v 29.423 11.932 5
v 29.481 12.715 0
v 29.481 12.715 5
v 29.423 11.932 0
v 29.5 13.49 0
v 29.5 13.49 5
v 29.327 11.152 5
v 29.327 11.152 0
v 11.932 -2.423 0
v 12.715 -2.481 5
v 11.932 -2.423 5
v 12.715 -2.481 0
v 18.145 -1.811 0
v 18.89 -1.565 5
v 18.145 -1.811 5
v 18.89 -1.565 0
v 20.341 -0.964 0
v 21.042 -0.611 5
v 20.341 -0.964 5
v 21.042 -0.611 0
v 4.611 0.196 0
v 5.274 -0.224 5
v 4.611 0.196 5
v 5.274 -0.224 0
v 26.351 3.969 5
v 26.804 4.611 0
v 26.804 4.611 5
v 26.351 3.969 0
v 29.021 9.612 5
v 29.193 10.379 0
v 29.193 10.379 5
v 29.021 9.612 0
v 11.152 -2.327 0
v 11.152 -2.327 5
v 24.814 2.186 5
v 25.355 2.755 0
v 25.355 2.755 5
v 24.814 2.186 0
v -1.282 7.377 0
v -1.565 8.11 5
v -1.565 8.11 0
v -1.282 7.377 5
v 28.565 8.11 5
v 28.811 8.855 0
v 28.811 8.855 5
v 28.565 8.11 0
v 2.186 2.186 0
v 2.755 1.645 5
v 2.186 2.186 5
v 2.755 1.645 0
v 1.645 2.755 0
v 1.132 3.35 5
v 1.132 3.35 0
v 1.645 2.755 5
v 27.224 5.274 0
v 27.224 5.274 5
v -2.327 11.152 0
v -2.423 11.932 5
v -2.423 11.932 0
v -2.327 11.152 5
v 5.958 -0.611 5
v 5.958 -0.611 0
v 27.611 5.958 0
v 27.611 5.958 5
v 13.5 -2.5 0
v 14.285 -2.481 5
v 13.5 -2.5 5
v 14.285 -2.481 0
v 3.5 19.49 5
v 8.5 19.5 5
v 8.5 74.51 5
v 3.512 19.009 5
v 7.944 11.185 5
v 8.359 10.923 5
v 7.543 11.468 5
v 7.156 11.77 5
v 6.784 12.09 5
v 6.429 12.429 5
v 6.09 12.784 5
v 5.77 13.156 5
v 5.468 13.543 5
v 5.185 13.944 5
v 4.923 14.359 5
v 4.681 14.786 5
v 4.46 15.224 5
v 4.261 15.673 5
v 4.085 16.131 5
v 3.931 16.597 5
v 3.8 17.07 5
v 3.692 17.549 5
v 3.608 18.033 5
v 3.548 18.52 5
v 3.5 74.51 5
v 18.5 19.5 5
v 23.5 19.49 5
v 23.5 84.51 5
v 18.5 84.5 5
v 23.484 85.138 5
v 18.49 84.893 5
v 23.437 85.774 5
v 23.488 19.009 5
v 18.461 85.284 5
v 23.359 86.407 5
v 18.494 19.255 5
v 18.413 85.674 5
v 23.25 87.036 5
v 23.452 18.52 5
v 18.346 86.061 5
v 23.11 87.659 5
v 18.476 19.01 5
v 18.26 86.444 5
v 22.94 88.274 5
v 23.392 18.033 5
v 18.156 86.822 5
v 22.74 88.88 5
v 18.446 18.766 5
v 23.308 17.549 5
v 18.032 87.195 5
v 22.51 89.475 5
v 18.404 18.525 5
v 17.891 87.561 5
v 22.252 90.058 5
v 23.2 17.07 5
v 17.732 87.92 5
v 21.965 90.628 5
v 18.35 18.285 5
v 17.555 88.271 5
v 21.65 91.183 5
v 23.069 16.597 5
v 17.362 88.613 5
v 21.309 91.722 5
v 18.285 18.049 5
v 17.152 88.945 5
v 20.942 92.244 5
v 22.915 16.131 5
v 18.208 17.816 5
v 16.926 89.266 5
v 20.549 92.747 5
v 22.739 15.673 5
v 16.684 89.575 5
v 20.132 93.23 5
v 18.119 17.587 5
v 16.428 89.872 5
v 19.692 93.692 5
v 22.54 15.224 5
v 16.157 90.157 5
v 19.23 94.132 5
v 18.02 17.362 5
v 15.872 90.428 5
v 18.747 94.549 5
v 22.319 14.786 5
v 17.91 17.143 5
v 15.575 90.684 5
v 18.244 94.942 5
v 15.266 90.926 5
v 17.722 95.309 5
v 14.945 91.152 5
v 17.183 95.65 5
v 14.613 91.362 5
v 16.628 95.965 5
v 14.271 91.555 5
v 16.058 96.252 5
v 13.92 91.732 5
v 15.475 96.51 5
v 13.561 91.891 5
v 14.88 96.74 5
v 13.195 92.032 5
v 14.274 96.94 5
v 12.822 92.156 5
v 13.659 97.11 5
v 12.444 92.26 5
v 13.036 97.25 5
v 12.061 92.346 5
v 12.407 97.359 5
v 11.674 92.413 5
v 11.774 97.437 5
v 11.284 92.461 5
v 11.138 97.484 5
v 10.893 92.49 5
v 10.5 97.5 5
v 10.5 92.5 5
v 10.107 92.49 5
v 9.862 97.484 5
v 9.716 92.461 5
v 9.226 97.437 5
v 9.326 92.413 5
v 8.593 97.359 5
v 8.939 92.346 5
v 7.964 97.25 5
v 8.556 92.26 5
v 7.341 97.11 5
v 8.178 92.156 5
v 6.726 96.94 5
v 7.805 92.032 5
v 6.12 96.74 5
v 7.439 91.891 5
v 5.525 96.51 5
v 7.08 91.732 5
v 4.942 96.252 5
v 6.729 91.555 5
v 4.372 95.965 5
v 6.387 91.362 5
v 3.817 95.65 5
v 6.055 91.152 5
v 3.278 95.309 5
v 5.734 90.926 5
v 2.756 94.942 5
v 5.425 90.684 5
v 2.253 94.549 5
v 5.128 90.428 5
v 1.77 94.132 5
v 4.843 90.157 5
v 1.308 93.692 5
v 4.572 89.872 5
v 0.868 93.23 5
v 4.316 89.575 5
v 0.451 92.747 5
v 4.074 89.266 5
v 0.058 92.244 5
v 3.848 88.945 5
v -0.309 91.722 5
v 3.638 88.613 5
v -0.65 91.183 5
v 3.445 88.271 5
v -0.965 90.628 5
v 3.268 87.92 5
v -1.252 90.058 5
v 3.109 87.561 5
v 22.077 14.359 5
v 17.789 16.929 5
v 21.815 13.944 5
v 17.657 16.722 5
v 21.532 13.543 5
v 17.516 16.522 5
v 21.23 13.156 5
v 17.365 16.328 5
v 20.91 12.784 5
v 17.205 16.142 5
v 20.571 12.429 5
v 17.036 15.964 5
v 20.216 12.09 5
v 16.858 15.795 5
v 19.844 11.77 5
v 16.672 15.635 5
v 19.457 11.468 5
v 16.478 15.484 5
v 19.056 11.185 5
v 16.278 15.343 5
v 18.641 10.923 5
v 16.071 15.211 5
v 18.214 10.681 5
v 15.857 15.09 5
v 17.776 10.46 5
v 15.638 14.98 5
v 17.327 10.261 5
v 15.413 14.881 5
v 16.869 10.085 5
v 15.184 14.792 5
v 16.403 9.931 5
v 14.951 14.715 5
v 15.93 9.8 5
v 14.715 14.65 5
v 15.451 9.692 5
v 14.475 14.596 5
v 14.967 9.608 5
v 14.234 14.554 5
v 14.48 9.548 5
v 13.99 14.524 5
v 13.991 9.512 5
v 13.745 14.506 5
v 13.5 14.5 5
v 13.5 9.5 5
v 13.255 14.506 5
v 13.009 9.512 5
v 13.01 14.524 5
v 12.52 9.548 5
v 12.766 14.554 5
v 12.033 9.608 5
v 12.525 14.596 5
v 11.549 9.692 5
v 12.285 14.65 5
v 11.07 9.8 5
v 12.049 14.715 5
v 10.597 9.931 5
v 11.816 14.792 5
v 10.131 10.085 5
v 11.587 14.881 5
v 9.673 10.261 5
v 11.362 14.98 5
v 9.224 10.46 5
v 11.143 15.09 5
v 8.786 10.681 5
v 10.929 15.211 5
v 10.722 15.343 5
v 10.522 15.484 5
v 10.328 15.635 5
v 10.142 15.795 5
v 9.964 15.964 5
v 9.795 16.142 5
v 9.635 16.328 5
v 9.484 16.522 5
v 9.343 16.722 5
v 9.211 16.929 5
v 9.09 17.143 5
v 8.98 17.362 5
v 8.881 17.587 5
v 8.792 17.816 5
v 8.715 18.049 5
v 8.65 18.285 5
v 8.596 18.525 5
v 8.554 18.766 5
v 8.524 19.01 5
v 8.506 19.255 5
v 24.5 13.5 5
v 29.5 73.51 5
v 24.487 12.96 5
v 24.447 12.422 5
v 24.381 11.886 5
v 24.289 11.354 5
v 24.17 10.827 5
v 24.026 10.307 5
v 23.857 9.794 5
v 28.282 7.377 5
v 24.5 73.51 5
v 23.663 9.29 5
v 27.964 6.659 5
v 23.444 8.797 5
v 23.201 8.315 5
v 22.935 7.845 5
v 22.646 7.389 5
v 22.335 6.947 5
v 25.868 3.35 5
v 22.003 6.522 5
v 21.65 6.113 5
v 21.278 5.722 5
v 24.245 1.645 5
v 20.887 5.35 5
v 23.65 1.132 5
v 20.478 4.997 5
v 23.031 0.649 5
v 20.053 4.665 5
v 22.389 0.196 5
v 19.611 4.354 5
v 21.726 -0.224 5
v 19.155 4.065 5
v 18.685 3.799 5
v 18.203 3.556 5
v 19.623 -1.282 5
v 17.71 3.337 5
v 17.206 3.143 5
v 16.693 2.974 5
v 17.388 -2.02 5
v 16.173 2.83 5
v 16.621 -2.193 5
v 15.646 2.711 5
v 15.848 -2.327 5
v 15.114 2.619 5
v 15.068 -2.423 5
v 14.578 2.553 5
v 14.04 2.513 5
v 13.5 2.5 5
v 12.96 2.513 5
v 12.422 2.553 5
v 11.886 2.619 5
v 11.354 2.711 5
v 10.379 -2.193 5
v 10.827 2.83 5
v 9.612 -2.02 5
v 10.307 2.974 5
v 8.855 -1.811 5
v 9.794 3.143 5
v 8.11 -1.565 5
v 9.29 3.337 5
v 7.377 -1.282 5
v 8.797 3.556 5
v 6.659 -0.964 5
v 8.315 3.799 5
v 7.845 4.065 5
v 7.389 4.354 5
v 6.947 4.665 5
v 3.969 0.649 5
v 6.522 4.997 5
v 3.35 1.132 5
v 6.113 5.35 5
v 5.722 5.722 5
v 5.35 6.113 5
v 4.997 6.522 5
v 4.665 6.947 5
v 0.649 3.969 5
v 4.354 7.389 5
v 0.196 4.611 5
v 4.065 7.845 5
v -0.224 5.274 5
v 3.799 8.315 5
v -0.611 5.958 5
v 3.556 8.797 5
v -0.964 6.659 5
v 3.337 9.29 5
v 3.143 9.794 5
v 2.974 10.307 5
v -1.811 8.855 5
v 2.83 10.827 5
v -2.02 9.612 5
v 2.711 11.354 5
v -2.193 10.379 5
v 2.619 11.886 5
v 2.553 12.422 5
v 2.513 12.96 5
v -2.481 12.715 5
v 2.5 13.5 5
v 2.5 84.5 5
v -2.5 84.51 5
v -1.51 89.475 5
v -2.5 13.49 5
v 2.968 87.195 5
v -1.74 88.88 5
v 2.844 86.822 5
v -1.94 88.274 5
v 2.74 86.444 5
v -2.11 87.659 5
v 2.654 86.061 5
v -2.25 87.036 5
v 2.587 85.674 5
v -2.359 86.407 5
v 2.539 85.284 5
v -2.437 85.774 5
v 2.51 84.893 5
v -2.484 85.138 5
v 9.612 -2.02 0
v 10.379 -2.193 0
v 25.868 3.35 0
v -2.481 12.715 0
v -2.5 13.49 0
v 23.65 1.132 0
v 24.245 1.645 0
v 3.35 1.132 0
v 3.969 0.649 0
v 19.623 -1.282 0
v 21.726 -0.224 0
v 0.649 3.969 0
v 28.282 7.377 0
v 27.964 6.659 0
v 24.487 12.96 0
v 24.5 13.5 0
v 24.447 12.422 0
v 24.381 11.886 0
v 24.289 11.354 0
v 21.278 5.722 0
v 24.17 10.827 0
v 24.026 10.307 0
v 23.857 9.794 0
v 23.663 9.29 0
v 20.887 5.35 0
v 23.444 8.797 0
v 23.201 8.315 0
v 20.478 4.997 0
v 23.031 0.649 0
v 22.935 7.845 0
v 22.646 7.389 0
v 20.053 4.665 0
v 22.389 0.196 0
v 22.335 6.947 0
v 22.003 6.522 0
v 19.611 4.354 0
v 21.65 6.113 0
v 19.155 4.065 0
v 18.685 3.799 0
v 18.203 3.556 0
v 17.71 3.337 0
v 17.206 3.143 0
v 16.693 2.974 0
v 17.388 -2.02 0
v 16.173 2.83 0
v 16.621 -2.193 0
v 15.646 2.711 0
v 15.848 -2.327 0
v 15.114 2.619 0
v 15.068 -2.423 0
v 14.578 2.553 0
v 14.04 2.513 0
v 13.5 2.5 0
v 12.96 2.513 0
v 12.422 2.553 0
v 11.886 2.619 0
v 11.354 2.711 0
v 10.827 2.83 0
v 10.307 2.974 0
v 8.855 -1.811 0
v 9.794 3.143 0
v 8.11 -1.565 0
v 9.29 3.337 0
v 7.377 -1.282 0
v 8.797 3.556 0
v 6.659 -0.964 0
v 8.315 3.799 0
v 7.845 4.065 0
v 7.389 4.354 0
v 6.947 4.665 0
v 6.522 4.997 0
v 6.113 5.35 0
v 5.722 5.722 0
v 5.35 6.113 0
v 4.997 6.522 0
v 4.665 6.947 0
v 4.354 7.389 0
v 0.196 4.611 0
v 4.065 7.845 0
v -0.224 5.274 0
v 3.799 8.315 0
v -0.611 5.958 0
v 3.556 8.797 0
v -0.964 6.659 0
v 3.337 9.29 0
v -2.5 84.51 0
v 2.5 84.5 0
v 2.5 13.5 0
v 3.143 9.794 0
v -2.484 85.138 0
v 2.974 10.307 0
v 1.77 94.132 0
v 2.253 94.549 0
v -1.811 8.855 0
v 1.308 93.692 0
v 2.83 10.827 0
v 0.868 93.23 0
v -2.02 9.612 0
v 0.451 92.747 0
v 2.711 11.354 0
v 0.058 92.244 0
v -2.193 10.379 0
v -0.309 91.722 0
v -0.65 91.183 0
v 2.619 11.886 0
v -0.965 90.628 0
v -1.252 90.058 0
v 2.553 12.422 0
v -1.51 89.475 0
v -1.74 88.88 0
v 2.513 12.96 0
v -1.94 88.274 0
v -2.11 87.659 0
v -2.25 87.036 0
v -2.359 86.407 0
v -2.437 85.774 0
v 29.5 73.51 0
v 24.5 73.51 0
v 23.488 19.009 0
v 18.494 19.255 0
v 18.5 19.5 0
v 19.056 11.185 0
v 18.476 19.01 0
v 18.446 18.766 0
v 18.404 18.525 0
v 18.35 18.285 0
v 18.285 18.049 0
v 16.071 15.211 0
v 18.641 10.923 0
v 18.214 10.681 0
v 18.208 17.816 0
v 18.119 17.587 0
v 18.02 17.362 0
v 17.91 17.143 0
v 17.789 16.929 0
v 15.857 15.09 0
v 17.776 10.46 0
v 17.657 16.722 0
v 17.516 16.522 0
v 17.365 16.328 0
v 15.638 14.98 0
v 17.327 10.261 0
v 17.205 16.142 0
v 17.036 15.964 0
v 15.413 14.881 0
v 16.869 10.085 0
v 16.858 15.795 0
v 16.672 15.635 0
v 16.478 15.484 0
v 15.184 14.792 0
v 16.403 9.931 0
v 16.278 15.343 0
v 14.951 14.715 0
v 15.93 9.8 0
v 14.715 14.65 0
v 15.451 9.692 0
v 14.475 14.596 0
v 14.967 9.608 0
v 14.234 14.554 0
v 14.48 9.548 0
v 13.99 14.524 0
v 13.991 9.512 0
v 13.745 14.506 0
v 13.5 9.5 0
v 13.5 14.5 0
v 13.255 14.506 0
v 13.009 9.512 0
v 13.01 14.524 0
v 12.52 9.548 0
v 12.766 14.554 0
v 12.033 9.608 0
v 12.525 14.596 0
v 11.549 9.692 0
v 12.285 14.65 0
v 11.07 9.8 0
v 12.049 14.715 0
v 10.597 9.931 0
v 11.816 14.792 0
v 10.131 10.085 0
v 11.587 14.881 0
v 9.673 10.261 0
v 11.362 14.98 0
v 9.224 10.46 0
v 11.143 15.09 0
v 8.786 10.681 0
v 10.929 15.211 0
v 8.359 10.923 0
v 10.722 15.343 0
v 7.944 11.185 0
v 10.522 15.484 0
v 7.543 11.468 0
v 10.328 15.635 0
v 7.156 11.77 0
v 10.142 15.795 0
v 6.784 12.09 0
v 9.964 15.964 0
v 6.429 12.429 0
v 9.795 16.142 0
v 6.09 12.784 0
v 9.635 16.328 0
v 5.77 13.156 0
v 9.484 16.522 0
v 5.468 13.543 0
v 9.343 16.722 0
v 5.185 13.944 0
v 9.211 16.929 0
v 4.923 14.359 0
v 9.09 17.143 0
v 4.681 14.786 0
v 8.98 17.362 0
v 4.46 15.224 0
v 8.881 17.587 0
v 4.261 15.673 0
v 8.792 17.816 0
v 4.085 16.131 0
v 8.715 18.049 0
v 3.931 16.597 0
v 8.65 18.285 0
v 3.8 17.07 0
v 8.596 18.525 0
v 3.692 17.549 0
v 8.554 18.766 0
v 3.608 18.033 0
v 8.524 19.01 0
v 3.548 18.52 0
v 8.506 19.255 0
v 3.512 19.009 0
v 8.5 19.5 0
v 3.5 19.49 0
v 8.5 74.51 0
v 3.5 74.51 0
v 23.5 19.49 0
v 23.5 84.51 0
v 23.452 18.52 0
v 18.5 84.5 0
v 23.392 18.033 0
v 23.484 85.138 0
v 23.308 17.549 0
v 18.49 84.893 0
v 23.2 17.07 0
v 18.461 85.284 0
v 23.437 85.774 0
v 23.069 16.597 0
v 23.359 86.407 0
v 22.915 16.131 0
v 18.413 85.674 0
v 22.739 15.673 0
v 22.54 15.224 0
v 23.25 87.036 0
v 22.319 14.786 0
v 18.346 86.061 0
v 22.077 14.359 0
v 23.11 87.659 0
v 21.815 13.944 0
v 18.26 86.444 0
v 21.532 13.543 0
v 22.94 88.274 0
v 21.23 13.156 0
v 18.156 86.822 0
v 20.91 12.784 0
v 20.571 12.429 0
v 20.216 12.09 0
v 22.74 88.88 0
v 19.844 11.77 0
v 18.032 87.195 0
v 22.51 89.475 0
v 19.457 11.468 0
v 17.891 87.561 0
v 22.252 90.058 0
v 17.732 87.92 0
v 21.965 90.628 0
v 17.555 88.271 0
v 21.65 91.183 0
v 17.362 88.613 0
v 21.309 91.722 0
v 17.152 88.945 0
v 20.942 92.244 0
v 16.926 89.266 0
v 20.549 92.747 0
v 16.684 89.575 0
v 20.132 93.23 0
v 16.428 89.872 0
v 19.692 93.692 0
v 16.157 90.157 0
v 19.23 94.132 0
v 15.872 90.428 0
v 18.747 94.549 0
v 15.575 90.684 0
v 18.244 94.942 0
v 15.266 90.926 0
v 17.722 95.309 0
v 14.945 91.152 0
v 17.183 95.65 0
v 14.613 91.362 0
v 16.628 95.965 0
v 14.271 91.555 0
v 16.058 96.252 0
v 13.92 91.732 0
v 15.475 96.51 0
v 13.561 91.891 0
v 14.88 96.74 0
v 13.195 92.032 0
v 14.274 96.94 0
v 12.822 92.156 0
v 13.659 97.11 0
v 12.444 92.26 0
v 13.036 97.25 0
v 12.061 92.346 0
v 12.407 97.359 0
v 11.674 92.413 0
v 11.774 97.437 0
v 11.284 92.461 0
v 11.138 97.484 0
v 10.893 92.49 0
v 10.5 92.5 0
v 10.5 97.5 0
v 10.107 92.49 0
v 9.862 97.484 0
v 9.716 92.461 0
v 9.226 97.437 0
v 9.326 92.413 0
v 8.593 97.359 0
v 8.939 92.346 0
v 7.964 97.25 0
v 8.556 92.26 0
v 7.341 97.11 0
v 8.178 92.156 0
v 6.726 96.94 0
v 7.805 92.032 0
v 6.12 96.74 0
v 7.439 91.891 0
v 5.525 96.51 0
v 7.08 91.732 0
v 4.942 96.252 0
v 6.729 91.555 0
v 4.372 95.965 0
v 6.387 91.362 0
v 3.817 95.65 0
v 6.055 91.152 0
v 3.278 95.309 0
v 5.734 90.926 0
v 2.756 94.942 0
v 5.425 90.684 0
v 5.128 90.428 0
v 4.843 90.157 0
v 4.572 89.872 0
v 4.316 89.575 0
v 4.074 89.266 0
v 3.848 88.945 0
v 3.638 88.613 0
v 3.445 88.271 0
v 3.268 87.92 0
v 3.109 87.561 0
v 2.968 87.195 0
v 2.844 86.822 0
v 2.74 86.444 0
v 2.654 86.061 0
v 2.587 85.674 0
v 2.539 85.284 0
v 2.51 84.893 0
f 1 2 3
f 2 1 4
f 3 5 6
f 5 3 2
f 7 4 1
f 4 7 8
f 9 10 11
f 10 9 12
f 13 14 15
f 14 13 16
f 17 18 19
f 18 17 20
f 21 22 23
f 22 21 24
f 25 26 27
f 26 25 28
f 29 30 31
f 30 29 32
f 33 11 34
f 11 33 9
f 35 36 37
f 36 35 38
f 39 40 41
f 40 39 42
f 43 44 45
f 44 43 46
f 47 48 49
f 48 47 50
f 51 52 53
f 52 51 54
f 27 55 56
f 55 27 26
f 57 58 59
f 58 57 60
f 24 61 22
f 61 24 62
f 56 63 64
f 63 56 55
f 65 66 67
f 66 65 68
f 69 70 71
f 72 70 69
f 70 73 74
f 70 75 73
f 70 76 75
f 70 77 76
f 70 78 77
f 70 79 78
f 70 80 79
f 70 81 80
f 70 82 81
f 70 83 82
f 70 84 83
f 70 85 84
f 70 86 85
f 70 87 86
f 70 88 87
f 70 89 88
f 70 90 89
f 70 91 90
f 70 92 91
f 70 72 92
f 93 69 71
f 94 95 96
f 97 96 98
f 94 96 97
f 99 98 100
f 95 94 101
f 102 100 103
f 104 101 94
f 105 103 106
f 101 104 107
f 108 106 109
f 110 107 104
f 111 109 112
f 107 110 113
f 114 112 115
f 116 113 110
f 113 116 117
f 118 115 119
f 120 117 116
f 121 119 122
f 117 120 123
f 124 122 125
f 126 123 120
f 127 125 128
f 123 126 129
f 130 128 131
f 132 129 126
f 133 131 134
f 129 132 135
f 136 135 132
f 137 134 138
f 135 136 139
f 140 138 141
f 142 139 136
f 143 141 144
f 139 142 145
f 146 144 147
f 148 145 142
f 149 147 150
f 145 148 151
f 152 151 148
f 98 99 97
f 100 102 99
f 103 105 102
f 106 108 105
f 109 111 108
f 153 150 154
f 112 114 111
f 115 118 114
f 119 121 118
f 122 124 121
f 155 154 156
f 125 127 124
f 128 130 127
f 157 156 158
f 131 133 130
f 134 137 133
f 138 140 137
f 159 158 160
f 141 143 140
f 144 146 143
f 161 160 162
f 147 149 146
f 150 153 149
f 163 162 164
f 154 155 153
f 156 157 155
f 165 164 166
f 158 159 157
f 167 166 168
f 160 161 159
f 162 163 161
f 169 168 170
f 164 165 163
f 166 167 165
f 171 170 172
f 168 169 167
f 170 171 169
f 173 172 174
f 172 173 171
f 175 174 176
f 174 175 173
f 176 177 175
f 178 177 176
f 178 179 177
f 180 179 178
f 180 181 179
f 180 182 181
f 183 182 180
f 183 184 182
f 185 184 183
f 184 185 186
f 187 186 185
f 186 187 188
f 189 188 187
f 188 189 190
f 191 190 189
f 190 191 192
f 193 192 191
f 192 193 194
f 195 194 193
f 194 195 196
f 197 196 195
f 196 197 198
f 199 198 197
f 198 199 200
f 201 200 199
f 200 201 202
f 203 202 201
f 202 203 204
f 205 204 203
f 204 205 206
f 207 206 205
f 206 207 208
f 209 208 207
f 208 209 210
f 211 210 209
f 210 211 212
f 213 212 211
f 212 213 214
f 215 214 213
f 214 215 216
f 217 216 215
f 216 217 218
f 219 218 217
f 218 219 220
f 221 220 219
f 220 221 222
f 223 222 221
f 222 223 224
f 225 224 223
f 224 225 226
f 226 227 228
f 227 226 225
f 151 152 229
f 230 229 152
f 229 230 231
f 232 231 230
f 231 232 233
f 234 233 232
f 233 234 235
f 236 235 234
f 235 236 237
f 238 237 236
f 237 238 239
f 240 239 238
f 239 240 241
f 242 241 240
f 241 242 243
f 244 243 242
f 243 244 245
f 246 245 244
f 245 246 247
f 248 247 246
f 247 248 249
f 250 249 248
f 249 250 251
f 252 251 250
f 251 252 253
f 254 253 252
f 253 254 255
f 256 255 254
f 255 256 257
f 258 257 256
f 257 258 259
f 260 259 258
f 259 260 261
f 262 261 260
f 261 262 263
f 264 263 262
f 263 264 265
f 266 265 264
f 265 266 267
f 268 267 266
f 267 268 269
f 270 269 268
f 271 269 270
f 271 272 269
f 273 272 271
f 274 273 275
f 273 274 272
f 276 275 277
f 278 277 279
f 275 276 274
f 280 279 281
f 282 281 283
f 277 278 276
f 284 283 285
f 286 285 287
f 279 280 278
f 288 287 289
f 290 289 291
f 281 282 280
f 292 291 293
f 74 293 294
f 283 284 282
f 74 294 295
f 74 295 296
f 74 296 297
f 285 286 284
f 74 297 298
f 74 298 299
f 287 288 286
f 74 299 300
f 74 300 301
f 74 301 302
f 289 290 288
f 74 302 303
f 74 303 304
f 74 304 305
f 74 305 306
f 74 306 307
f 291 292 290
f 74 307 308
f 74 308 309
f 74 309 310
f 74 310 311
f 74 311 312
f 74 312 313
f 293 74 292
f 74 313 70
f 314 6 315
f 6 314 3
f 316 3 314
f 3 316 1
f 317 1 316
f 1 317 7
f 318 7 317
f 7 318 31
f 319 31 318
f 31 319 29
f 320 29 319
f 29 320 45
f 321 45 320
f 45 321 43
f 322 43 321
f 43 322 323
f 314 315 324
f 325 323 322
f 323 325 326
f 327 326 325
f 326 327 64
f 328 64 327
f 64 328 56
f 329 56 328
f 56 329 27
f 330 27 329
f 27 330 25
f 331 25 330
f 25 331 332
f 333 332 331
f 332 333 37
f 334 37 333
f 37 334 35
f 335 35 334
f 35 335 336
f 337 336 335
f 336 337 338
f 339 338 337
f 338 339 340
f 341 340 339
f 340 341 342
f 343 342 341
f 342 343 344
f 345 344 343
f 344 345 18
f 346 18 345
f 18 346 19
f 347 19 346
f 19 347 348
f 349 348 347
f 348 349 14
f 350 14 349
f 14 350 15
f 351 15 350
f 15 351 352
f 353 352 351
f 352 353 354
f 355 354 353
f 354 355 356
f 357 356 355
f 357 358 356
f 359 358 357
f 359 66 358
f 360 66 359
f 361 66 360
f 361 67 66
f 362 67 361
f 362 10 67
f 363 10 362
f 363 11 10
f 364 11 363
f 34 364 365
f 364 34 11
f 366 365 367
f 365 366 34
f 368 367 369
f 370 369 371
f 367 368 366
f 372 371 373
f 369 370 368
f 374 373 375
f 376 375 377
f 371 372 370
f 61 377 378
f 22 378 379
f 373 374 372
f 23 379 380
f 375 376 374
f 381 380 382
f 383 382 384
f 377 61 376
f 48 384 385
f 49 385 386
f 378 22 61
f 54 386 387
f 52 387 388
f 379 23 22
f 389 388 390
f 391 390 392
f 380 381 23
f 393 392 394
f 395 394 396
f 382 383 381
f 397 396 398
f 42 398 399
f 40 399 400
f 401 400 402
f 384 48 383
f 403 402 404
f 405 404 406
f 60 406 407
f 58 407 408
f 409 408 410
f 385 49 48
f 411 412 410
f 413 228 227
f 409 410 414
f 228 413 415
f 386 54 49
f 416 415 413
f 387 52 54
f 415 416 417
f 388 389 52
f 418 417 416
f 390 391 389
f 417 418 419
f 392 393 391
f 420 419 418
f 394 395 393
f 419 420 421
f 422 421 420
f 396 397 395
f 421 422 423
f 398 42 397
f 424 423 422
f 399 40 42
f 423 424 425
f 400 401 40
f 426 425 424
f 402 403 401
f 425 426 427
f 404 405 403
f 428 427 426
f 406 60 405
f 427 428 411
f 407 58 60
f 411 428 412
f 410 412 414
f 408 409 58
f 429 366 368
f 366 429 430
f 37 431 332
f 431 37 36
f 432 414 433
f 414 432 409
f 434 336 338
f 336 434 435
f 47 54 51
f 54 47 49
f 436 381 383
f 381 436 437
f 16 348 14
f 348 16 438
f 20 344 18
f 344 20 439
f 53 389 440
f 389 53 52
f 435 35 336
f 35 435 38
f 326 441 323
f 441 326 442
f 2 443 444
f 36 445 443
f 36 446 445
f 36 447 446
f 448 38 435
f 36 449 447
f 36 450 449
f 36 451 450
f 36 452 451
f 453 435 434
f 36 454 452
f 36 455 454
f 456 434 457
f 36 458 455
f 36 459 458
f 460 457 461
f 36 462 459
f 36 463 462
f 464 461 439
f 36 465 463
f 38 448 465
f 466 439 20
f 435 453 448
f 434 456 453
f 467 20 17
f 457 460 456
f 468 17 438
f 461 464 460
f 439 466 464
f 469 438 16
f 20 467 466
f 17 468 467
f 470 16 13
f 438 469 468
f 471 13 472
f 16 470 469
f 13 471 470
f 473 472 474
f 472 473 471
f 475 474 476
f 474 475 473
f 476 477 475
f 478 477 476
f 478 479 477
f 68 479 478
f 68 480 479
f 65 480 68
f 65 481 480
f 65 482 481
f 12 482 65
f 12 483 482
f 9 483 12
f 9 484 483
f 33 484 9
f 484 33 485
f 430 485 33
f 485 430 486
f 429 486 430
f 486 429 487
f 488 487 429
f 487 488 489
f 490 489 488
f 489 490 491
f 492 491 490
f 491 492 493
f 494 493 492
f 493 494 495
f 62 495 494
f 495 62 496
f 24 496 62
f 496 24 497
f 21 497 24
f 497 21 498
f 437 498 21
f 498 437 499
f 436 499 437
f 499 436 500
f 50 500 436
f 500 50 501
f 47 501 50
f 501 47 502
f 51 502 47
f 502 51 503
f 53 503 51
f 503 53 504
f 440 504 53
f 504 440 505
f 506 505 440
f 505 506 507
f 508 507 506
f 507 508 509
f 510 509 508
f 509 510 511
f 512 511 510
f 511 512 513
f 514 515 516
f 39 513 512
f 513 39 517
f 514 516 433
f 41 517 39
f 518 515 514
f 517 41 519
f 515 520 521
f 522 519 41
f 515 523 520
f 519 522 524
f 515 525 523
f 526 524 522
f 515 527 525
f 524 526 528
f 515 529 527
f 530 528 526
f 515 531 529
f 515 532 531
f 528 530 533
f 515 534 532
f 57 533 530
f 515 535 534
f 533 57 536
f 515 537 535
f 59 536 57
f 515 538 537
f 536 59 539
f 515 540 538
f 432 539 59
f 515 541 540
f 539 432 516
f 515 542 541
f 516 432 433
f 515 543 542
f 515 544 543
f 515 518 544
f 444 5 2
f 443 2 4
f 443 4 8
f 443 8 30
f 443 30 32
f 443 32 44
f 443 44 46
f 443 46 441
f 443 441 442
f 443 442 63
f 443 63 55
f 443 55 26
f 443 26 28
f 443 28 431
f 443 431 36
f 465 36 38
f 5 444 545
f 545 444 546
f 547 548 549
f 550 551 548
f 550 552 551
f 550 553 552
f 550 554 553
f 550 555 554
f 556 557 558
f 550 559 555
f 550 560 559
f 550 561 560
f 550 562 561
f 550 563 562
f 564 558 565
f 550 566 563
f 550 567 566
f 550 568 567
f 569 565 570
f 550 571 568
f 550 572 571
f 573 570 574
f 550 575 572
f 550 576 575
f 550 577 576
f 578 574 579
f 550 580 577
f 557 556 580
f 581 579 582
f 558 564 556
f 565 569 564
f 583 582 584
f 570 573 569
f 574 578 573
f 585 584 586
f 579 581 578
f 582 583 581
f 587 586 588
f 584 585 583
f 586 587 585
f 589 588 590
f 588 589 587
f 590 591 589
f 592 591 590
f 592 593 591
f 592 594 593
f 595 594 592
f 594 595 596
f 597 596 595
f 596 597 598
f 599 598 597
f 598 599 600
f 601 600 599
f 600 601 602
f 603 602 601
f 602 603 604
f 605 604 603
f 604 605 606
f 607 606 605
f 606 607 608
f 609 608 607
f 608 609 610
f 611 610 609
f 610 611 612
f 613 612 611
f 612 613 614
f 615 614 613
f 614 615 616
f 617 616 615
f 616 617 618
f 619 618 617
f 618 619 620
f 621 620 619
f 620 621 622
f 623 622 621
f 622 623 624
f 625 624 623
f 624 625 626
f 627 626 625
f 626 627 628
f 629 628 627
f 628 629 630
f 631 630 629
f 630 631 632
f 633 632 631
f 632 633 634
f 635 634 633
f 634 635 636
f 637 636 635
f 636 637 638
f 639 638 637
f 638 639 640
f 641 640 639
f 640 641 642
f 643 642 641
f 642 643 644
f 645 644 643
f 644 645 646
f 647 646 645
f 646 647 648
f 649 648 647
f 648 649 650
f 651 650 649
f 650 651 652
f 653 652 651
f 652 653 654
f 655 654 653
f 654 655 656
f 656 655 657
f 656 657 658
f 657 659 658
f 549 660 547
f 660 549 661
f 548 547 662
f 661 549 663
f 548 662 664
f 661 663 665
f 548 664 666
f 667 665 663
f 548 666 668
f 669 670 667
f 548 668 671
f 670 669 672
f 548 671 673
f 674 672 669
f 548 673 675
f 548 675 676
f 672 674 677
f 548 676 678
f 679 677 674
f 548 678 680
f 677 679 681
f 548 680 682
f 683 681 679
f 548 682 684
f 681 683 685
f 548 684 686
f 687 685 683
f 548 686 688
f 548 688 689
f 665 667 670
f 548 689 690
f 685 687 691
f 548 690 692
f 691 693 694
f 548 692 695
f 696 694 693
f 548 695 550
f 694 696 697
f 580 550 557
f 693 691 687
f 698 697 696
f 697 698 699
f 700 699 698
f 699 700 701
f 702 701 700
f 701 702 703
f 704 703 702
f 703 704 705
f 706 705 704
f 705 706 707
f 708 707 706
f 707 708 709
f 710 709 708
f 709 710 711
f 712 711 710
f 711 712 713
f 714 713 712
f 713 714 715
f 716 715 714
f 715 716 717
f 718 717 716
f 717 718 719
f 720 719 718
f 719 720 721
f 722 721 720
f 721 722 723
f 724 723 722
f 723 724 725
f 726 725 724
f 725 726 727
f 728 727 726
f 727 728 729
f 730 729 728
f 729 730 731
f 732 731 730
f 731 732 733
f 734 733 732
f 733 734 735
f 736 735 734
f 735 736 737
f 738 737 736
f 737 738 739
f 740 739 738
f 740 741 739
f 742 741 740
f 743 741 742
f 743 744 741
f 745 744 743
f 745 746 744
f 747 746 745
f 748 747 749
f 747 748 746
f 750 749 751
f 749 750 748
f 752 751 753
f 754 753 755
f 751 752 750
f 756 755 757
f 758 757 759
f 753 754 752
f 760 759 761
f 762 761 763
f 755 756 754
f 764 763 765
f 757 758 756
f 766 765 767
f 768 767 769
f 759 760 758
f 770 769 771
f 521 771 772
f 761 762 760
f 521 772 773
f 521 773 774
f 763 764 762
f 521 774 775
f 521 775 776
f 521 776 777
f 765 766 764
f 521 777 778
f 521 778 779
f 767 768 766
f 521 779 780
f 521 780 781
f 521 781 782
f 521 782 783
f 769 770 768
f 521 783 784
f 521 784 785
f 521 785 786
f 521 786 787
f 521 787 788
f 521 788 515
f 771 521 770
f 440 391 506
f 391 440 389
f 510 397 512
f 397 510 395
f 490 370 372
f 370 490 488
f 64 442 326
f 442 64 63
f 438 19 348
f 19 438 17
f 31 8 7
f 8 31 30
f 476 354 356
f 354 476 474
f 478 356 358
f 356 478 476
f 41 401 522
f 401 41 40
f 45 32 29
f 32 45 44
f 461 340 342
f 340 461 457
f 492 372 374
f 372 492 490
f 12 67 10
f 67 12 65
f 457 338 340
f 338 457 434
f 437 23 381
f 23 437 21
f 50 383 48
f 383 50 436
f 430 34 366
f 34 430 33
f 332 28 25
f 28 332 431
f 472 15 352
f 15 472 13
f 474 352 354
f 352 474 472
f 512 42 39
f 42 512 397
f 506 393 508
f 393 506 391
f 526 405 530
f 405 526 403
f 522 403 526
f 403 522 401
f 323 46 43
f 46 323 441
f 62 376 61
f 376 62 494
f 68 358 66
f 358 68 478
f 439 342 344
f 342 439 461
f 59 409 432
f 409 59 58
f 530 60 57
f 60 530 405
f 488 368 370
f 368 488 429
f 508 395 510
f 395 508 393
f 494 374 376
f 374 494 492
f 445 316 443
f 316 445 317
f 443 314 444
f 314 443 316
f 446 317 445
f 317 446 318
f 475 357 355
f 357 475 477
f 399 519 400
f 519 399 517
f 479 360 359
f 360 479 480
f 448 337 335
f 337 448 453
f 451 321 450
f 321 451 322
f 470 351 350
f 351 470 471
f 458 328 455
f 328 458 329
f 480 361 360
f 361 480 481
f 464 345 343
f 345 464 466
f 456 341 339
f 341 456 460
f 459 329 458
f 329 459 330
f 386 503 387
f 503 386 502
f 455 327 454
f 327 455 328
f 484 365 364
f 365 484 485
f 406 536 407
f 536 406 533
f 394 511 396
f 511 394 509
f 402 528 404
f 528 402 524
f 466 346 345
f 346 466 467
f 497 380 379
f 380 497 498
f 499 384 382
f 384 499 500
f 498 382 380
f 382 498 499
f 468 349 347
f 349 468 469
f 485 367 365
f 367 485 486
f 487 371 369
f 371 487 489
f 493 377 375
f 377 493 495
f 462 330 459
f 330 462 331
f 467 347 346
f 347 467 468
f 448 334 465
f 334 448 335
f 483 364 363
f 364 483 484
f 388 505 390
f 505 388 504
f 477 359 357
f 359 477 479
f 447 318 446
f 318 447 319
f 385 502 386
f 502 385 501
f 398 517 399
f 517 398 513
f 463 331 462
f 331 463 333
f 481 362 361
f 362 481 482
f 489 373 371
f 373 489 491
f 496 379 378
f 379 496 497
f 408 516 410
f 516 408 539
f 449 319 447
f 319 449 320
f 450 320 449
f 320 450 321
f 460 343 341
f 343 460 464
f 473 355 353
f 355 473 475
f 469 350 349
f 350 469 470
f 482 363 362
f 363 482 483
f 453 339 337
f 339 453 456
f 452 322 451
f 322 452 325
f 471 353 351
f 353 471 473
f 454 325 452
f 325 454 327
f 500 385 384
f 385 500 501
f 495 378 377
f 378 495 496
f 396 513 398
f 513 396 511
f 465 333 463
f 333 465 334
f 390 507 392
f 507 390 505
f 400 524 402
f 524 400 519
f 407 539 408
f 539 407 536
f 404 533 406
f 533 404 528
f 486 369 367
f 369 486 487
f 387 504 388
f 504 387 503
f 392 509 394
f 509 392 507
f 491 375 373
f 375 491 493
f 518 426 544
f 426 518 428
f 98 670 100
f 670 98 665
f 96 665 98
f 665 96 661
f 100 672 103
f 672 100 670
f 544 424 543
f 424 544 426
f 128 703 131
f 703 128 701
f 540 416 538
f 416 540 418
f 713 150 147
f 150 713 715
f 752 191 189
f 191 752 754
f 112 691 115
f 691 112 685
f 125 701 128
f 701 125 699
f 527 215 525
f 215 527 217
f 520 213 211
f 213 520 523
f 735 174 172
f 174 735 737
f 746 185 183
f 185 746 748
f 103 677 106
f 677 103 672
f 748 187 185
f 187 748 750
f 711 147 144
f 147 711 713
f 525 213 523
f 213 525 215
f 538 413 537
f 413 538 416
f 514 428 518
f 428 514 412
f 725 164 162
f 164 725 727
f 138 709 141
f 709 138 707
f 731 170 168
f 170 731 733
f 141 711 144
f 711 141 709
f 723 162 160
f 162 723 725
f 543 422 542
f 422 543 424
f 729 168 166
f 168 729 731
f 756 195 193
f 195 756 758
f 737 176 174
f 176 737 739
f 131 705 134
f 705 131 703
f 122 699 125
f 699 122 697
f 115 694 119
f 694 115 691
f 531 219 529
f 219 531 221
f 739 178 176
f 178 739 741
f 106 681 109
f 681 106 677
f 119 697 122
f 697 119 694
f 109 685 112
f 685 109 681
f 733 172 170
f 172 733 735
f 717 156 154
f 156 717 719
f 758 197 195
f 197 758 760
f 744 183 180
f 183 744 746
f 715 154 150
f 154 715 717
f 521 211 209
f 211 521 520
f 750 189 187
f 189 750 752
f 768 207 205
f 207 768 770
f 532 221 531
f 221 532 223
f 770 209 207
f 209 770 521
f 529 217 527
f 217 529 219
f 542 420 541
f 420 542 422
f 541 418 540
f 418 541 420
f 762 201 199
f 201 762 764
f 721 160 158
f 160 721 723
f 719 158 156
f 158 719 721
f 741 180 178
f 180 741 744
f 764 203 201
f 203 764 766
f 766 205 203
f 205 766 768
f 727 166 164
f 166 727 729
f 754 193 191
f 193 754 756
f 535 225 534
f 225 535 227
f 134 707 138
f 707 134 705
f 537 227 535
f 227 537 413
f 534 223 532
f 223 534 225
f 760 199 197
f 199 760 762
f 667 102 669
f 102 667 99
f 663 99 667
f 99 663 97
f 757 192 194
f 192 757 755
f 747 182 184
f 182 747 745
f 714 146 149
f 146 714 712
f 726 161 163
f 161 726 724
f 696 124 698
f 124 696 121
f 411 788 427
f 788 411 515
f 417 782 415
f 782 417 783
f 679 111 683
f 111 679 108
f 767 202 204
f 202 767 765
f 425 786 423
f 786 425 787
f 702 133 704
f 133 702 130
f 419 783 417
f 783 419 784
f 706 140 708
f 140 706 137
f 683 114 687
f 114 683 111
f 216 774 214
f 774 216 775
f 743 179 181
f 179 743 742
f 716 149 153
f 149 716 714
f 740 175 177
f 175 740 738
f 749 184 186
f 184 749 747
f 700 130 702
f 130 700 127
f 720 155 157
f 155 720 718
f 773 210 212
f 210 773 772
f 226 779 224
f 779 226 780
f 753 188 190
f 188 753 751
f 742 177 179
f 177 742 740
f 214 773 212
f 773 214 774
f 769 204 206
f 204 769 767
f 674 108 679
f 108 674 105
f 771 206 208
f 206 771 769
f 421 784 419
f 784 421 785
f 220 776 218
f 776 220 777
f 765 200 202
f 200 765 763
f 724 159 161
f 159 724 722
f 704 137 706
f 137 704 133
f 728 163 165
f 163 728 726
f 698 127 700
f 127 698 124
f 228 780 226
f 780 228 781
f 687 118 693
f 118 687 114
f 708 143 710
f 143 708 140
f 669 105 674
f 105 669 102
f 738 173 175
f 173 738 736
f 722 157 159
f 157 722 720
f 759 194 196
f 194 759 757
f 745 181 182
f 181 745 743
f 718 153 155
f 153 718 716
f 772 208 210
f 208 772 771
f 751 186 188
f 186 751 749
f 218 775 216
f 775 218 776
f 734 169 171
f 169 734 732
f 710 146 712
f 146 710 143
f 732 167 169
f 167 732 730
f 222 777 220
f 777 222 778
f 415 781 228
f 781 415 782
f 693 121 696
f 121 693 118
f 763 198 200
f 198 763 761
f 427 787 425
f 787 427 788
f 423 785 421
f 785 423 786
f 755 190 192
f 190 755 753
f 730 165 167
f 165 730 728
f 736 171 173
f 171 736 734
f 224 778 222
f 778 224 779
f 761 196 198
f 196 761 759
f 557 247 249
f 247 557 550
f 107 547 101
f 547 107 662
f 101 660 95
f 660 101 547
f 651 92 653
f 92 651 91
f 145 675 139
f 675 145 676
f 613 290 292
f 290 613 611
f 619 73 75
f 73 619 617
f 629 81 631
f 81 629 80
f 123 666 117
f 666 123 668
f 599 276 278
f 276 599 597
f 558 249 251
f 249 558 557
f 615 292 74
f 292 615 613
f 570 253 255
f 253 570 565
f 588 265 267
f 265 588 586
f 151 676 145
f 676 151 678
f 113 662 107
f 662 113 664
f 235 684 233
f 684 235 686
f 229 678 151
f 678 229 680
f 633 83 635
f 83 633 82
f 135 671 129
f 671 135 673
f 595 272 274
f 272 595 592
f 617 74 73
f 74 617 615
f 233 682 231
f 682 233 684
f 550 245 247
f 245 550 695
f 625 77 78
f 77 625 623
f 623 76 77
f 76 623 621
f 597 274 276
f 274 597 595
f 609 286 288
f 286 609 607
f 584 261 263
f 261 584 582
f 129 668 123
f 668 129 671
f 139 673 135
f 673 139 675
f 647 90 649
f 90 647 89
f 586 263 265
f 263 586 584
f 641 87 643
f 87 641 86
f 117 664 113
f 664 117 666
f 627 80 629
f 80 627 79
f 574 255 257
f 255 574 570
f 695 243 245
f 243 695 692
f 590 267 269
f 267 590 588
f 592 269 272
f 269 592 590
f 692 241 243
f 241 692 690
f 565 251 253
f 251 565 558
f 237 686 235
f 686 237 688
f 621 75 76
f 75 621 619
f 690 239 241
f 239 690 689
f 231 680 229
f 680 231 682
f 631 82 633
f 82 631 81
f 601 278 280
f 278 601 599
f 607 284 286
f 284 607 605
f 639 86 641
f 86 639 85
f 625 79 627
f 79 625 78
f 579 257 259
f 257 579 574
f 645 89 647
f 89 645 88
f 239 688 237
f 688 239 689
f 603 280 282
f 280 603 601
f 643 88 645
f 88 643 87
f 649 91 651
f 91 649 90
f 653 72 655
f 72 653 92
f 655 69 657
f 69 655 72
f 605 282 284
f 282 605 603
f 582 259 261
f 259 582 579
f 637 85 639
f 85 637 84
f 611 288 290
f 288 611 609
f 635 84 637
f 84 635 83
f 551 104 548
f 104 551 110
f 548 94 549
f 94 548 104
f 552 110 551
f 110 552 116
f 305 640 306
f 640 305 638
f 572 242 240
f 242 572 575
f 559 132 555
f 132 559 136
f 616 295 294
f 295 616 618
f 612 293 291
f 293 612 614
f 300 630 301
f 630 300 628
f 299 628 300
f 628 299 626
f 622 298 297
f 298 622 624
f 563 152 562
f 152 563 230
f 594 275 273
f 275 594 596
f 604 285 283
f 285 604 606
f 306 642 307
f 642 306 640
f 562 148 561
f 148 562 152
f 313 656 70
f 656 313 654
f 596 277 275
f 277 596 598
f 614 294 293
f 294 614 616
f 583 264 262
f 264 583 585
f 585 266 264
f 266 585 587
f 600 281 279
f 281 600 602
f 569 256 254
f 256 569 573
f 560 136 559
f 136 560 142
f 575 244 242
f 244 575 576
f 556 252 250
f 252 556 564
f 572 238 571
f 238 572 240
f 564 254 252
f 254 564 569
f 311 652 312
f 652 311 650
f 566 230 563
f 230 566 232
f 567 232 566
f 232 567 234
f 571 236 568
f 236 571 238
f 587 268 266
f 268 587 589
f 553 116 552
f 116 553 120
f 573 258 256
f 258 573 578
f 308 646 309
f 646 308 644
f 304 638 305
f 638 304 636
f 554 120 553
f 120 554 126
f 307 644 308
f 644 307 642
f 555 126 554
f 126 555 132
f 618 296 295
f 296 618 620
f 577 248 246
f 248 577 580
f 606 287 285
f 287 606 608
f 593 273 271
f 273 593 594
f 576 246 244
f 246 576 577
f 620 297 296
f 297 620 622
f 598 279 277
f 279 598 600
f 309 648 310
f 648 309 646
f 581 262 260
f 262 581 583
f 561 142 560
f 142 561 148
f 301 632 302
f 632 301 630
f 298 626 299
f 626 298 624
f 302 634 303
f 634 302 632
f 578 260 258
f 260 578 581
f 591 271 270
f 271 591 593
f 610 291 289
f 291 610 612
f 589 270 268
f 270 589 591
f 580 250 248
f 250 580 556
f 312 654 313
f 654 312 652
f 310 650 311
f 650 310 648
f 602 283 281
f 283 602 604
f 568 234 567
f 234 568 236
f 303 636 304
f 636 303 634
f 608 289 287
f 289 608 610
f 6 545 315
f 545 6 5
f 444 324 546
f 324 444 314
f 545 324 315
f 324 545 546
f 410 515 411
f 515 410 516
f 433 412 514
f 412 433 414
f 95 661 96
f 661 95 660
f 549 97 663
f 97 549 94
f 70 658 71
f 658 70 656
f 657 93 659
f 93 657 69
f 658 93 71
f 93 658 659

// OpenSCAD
strip_height = 5;
strip_width = 5;
total_width = 32;
total_length = 100;
margin = 1;

// Total dimensions translated to centerlines
cl_width = total_width - strip_width;
cl_length = total_length - strip_width;

// Length of the outer end as a fraction of total length
k1=0.60;
// Length of the inner loop as a fraction of total length
k2=0.65;
// Length of the inner end as a fraction of total length;
k3=0.55;

$fn=128+0;

d1 = cl_width;
d2 = d1 - strip_width - margin;
d3 = d2 - strip_width - margin;

r1 = d1/2;
r2 = d2/2;
r3 = d3/2;

l1 = cl_length - r1 - r2;
l2 = total_length * k2;
l3 = total_length * k3;

eps1=0.01+0;
eps2=2*eps1;

// R is measured at center line.
module arc(r) {
  difference() {
    cylinder(r=r+strip_width/2, h=strip_height);
    translate([0, 0, -eps1]) cylinder(r=r-strip_width/2, h=strip_height+ eps2);
    translate([-1.5*r, -2*r, -eps1]) cube([3*r, 2*r, strip_height+ eps2]);
  }  
}

module bar(l) {
  translate([-strip_width/2, -eps1, 0]) cube([strip_width, l+2*eps1, strip_height]);  
}

translate([2*r1, r1, 0]) bar(k1*total_length);

translate([r1, r1, 0]) mirror([0, 1, 0]) arc(r1);

translate([0, r1, 0]) bar(l1);

translate([r2, r1 + l1, 0]) arc(r2);

translate([2*r2, r1+l1-l2, 0 ])bar(l2);

translate([d2-r3, r1+l1-l2, 0]) mirror([0, 1, 0]) arc(r3);

translate([strip_width + margin, r1+l1-l2, 0]) bar(l3);
  
  
